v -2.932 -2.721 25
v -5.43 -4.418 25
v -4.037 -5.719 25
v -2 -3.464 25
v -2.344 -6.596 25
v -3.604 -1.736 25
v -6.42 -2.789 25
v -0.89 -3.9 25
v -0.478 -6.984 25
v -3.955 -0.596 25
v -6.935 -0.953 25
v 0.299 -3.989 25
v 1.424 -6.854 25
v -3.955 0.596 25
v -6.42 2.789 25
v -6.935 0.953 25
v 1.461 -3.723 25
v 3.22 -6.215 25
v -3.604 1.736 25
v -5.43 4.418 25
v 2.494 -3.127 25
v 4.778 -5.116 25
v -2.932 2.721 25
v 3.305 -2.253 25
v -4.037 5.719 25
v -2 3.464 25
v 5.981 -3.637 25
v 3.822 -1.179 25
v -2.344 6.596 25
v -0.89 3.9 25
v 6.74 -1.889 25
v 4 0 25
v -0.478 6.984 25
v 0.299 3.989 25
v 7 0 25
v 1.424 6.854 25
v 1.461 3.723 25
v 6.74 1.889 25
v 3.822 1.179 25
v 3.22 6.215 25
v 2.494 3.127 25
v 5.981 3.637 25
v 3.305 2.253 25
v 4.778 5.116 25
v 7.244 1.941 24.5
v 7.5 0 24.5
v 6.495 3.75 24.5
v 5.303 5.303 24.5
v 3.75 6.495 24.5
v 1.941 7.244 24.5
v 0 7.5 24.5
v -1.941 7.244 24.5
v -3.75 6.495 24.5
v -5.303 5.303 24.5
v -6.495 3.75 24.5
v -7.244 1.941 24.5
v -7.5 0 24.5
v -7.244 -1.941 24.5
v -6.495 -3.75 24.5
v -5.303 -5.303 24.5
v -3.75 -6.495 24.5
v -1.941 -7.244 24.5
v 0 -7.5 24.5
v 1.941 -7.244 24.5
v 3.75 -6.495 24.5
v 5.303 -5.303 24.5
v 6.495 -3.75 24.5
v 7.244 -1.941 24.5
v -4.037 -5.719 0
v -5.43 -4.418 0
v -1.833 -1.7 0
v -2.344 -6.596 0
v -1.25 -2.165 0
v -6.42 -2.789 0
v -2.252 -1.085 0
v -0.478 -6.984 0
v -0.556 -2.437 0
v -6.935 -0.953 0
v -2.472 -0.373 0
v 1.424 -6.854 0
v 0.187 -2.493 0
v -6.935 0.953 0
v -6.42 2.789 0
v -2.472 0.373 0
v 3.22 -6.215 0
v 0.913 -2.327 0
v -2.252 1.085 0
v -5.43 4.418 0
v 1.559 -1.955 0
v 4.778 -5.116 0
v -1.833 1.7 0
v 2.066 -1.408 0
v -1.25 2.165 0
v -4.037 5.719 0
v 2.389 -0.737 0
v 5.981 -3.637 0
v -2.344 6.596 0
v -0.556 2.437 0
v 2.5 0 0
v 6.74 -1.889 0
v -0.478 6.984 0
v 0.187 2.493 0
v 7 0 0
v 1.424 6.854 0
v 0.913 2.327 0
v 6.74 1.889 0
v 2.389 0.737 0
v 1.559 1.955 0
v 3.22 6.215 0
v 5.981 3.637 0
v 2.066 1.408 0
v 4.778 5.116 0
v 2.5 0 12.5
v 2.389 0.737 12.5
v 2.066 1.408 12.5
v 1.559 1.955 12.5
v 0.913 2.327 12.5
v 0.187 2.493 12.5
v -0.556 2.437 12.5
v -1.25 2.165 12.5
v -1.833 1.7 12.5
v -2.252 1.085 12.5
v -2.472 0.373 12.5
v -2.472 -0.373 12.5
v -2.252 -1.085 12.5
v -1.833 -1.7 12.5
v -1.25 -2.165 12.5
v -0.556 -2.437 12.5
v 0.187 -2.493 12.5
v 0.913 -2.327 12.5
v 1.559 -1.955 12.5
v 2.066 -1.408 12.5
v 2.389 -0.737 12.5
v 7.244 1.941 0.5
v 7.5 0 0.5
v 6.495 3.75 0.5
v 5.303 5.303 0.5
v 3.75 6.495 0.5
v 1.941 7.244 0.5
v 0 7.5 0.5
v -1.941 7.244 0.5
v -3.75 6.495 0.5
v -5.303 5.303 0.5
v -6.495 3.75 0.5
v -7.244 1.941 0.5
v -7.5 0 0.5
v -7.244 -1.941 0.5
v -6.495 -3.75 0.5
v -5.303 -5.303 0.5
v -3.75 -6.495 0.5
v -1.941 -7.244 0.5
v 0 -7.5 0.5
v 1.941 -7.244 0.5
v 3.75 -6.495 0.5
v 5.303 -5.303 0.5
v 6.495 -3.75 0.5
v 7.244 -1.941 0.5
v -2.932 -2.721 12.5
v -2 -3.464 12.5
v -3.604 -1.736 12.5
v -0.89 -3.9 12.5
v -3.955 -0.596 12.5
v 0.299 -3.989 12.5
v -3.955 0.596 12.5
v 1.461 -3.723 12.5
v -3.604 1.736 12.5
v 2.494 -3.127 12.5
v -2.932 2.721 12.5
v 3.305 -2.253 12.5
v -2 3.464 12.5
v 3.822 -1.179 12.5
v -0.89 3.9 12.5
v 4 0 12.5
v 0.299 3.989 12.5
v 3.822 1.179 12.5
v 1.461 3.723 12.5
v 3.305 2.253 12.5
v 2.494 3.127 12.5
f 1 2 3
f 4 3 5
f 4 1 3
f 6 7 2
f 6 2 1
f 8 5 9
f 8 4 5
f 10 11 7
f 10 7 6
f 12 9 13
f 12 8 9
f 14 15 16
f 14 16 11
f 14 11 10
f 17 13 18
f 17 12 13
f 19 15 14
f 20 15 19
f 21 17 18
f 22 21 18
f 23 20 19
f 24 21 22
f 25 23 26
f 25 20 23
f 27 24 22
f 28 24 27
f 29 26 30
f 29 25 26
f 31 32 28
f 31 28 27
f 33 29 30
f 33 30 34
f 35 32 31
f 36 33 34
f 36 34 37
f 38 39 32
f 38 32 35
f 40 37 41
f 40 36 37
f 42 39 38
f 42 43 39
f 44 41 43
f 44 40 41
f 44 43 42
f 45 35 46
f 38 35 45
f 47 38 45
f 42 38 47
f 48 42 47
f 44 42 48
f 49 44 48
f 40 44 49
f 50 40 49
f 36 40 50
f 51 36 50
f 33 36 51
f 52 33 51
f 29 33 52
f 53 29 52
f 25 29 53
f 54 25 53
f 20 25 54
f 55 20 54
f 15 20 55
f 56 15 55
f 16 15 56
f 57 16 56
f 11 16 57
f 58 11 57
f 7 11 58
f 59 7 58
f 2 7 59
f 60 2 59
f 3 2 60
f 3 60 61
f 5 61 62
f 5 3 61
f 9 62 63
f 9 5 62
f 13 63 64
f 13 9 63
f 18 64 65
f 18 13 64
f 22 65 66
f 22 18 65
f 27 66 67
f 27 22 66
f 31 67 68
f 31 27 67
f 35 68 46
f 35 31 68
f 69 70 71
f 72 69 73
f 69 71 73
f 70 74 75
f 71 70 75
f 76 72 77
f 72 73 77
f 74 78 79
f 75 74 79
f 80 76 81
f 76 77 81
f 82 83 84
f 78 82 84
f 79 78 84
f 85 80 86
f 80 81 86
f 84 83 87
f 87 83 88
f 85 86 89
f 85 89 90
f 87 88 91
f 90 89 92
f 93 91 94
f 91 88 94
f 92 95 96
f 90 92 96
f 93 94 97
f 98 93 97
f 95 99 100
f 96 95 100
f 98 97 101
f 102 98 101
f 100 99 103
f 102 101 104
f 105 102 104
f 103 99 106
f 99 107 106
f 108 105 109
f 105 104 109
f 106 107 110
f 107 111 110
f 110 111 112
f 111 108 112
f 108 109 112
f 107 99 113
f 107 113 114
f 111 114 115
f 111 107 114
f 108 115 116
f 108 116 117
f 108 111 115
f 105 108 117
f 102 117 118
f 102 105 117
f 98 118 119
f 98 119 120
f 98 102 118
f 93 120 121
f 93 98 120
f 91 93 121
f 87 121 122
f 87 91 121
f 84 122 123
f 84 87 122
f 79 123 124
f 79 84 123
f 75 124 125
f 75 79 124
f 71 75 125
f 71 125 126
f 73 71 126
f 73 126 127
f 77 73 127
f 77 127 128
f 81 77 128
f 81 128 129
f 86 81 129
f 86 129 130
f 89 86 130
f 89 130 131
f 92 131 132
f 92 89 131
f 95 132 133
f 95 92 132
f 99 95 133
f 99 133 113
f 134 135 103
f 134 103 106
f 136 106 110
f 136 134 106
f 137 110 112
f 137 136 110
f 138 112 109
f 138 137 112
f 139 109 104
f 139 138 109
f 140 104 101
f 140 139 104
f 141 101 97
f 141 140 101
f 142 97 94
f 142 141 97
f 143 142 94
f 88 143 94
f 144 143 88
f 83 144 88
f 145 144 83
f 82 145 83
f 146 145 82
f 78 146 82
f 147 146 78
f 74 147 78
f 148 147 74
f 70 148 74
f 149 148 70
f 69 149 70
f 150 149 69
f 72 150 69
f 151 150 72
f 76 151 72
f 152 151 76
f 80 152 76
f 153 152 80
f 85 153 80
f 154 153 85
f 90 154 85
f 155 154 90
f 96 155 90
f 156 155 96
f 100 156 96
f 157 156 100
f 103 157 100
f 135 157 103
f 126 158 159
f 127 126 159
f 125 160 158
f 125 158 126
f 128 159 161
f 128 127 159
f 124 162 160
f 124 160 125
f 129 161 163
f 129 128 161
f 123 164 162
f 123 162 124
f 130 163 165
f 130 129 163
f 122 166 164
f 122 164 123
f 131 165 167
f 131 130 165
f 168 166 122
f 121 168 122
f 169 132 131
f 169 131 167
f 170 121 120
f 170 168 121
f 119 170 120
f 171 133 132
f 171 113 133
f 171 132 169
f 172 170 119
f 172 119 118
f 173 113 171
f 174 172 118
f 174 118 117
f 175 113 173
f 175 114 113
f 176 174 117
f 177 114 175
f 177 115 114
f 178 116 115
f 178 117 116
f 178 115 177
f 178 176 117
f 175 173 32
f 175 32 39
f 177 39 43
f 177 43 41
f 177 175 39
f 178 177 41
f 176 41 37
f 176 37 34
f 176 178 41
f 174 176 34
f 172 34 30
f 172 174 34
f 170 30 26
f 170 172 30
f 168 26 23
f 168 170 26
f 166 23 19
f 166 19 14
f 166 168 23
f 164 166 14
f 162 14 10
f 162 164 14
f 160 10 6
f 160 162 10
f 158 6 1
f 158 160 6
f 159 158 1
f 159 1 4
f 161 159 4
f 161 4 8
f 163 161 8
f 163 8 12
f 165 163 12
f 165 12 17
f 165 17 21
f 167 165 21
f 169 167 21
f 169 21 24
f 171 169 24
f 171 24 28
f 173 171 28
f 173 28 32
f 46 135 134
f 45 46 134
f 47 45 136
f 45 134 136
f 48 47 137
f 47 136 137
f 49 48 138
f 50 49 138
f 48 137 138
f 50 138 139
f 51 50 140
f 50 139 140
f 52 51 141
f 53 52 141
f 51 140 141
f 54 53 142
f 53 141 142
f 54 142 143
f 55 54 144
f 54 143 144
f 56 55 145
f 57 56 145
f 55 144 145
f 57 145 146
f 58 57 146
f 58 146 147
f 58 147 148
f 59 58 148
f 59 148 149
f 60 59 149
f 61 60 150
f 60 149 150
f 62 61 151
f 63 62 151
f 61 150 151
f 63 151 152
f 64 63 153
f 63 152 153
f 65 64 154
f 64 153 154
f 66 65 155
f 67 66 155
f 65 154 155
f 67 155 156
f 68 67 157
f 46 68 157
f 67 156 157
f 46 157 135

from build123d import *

# Parameters (mm, degrees)
F0_R     = 7.5
F0_R_2   = 4
F1_DEPTH = 25
F0_R_3   = 2.5
F2_DEPTH = 12.5
F3_DEPTH = 12.5
F4_SIZE  = 0.5


with BuildPart() as f1:
    # F0 (on Top) → F1 (new body)
    with BuildSketch(Plane.XY):
        Circle(F0_R)
        Circle(F0_R_2, mode=Mode.SUBTRACT)
    extrude(amount=F1_DEPTH)

    # F0 (on Top) → F2 (join)
    with BuildSketch(Plane.XY):
        Circle(F0_R_3)
        Circle(F0_R_2)
        Circle(F0_R_3, mode=Mode.SUBTRACT)
    extrude(amount=F2_DEPTH)

    # F0 (on Top) → F3 (cut)
    with BuildSketch(Plane.XY):
        Circle(F0_R_3)
    extrude(amount=F3_DEPTH, mode=Mode.SUBTRACT)

    # F4
    f4_edges = [f1.edges().sort_by_distance(p)[0] for p in [
        (-7.5, 0, 25),
        (-7.5, 0, 0),
    ]]
    chamfer(f4_edges, length=F4_SIZE)


solid = f1.part
